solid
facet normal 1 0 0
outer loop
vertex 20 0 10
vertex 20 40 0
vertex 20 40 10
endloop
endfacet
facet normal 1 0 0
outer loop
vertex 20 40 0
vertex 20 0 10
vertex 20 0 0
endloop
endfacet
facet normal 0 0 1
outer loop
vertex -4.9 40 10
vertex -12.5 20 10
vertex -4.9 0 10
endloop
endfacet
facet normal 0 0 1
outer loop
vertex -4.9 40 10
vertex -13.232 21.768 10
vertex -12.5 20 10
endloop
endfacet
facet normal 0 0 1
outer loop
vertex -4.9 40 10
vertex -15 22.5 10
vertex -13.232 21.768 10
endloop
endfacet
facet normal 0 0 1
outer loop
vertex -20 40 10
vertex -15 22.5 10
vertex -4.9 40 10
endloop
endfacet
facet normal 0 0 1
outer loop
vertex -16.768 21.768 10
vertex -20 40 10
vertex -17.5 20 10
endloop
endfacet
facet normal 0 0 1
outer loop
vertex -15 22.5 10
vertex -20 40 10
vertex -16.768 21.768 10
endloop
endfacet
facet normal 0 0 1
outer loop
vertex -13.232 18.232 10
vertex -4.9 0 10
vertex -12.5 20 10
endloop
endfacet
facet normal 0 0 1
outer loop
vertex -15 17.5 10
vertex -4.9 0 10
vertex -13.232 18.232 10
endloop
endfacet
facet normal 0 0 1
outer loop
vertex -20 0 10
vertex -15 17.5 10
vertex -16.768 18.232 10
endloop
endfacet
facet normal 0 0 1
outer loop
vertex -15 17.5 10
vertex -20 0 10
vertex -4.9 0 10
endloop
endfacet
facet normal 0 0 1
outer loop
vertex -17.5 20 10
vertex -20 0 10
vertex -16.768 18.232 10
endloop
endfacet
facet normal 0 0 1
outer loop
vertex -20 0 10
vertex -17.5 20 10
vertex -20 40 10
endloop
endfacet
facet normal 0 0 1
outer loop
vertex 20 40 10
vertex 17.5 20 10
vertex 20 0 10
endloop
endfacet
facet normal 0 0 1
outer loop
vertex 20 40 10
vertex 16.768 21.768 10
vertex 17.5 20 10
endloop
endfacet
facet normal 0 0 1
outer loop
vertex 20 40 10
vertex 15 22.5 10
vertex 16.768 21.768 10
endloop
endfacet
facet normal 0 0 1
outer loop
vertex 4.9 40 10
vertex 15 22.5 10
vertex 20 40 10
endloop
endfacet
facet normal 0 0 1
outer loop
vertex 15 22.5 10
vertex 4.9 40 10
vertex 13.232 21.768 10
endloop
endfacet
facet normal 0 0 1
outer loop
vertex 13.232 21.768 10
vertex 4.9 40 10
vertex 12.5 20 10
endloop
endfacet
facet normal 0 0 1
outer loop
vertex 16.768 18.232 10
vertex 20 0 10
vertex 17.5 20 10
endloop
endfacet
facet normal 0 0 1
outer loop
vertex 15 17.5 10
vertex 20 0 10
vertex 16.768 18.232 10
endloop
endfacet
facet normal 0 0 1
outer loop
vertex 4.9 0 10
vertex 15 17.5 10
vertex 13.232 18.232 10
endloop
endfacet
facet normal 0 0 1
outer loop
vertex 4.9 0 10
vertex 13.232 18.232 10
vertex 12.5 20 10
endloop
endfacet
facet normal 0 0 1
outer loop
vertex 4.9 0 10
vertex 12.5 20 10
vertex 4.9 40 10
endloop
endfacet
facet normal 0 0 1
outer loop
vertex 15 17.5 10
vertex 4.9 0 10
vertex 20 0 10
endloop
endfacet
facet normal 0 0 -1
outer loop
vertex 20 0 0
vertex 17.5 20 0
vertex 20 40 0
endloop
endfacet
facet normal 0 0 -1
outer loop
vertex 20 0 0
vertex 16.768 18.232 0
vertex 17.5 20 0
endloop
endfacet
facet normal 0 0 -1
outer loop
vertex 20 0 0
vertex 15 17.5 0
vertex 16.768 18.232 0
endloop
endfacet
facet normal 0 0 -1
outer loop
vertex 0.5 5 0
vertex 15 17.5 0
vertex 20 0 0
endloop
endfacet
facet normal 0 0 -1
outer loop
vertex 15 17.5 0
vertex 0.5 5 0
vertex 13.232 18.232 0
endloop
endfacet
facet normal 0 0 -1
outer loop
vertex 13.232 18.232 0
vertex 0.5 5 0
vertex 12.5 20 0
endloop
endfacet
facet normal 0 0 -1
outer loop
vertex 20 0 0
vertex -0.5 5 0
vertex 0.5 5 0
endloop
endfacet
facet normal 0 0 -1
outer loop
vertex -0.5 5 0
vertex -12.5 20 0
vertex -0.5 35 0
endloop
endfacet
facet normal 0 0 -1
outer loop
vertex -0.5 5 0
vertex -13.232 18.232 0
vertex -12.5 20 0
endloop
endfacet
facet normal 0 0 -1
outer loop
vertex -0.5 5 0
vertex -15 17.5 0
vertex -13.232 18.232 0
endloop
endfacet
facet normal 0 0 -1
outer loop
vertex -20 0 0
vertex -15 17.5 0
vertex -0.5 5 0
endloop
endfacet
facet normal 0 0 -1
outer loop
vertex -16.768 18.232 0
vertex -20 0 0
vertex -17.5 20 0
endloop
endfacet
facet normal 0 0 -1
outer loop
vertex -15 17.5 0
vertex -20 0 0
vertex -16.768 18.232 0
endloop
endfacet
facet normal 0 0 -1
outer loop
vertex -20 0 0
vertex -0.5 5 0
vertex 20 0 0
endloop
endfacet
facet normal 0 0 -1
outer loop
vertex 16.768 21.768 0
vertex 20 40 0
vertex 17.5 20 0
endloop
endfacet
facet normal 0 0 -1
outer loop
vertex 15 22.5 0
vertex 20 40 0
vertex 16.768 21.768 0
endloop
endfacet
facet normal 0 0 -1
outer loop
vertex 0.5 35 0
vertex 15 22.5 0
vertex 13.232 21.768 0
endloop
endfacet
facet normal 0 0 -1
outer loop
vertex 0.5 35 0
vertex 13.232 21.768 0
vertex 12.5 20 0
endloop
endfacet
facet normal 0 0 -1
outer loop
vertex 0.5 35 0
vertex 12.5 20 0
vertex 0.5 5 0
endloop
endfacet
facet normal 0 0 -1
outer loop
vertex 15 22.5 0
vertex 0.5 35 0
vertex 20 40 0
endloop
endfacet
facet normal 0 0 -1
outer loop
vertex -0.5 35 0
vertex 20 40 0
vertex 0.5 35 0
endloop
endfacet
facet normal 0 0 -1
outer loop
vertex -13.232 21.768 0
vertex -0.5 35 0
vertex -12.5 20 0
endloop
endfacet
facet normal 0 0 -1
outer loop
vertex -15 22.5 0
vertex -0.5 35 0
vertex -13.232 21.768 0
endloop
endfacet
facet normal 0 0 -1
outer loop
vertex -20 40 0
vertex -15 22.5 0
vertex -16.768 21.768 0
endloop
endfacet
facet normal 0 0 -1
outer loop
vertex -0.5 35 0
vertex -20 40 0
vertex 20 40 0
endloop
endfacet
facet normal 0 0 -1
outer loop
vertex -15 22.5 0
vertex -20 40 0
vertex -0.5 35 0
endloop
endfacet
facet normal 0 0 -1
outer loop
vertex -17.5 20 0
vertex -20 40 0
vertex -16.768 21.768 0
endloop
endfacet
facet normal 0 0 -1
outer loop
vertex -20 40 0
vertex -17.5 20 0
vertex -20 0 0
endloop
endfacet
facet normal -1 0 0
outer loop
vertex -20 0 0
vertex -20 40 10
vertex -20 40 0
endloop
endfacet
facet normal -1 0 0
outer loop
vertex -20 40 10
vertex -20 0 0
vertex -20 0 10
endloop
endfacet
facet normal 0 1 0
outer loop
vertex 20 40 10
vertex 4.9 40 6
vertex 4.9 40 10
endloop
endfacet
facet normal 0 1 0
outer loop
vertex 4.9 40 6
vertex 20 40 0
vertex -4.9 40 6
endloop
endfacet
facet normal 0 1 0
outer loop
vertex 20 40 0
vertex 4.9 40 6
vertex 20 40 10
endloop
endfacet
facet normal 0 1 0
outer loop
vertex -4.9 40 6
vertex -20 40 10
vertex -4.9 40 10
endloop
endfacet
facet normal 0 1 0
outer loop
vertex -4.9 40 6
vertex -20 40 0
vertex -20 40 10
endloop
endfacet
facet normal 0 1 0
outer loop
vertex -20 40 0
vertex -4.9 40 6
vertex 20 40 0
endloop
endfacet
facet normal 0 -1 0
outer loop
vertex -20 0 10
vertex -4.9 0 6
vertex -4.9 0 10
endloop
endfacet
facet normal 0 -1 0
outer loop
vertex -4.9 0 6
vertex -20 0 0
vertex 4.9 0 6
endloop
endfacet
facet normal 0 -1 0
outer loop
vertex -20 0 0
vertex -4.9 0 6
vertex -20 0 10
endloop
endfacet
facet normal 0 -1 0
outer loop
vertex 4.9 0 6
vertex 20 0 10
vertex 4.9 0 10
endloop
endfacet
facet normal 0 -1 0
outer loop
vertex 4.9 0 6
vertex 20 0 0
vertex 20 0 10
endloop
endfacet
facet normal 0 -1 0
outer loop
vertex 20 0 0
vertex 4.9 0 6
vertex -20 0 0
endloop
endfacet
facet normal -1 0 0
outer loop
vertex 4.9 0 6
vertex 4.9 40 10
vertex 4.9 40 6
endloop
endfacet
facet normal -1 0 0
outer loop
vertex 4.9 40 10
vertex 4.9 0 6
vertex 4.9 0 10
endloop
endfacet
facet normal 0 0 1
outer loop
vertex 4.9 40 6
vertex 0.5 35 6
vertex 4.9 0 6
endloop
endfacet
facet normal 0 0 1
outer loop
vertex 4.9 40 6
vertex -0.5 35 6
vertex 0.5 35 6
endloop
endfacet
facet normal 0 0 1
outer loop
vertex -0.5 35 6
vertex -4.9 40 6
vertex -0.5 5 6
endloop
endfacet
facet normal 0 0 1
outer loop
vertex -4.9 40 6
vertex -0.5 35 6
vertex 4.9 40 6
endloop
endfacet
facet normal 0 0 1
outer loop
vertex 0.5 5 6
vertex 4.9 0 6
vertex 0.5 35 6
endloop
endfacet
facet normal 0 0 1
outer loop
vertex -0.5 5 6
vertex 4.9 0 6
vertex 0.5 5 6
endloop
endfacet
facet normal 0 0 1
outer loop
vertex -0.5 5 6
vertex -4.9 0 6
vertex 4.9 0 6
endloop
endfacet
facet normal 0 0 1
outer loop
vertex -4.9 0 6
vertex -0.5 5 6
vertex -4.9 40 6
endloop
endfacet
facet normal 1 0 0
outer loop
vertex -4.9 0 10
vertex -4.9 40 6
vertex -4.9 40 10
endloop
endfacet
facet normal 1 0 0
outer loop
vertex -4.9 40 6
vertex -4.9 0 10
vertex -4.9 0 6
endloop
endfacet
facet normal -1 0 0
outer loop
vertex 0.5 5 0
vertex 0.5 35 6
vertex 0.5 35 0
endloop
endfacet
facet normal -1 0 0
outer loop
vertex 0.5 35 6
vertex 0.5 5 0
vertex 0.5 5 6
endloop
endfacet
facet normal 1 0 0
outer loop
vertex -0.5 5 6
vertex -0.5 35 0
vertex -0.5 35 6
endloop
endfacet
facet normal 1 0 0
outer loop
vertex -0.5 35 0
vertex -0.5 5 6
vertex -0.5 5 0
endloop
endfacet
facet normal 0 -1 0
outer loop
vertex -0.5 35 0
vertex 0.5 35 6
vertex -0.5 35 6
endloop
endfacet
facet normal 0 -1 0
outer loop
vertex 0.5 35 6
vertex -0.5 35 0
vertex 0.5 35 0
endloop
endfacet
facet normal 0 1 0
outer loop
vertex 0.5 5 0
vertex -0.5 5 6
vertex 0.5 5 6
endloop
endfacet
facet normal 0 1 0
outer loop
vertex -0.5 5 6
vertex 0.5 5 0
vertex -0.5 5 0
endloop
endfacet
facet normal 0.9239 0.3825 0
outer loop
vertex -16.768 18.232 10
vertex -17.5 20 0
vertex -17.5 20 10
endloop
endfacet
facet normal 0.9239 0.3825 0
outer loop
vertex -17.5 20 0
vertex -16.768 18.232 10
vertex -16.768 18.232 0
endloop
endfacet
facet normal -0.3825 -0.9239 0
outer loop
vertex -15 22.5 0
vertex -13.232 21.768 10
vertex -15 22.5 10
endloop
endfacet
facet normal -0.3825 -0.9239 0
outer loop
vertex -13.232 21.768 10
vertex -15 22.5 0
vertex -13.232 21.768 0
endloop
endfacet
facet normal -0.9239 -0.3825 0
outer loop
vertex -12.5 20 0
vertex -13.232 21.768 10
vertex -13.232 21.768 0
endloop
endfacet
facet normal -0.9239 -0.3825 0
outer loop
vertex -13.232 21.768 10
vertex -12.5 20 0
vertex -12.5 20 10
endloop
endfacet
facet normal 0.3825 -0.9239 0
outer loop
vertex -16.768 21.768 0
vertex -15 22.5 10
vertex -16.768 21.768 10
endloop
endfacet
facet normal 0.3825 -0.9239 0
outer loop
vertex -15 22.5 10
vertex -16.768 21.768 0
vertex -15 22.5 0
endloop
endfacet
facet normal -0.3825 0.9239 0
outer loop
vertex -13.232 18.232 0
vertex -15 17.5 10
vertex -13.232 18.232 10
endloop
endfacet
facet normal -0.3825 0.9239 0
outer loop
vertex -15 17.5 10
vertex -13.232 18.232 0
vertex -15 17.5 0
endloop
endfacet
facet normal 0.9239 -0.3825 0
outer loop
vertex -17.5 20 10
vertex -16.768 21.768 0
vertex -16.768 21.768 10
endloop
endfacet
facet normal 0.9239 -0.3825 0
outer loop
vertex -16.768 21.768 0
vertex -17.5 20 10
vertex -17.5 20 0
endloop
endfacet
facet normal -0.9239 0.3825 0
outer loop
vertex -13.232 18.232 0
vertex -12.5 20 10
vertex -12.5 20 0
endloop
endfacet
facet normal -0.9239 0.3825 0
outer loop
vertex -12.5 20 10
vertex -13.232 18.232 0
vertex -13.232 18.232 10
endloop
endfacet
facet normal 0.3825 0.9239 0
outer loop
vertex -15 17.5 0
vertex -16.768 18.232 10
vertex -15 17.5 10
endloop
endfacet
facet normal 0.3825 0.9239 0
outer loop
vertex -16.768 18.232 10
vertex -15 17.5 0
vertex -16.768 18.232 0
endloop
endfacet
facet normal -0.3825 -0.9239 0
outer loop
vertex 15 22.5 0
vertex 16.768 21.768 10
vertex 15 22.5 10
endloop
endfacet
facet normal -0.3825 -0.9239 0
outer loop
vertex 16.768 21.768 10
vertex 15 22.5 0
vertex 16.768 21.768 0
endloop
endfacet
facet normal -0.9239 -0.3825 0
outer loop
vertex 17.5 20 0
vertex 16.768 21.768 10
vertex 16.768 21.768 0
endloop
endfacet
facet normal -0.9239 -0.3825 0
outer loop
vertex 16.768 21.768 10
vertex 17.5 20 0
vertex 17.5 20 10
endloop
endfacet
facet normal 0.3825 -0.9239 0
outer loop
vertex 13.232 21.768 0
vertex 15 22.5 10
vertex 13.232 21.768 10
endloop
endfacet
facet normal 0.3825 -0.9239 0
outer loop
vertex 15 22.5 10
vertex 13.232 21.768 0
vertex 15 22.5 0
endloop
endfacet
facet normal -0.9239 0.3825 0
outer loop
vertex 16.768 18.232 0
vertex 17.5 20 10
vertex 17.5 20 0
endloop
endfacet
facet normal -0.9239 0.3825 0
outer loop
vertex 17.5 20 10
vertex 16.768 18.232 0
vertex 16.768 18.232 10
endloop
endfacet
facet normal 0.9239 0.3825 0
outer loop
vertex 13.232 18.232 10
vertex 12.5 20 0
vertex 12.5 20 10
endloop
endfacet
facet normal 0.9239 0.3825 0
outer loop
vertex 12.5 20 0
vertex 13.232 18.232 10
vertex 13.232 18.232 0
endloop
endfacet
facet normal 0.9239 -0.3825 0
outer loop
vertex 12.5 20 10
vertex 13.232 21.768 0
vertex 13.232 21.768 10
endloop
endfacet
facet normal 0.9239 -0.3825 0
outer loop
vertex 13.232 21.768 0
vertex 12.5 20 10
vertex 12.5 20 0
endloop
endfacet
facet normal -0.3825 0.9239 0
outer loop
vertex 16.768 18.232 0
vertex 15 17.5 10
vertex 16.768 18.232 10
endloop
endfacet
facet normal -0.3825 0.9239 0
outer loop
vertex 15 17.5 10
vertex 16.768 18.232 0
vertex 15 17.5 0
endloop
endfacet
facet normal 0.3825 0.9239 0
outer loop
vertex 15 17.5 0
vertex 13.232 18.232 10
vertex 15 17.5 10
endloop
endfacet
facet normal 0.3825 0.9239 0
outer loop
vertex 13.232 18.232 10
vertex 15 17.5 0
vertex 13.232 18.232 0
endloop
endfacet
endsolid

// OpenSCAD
difference(){
	translate([-20,0,0])
	cube([40,40,10]);
	translate([-4.9,-1,6])
	cube([9.8,50,50]);
	translate([-0.5,5,-1])
	cube([1,30,50]);


	translate([-15,20,-1])
	cylinder(r=2.5,h=100);
	translate([15,20,-1])
	cylinder(r=2.5,h=100);
}
